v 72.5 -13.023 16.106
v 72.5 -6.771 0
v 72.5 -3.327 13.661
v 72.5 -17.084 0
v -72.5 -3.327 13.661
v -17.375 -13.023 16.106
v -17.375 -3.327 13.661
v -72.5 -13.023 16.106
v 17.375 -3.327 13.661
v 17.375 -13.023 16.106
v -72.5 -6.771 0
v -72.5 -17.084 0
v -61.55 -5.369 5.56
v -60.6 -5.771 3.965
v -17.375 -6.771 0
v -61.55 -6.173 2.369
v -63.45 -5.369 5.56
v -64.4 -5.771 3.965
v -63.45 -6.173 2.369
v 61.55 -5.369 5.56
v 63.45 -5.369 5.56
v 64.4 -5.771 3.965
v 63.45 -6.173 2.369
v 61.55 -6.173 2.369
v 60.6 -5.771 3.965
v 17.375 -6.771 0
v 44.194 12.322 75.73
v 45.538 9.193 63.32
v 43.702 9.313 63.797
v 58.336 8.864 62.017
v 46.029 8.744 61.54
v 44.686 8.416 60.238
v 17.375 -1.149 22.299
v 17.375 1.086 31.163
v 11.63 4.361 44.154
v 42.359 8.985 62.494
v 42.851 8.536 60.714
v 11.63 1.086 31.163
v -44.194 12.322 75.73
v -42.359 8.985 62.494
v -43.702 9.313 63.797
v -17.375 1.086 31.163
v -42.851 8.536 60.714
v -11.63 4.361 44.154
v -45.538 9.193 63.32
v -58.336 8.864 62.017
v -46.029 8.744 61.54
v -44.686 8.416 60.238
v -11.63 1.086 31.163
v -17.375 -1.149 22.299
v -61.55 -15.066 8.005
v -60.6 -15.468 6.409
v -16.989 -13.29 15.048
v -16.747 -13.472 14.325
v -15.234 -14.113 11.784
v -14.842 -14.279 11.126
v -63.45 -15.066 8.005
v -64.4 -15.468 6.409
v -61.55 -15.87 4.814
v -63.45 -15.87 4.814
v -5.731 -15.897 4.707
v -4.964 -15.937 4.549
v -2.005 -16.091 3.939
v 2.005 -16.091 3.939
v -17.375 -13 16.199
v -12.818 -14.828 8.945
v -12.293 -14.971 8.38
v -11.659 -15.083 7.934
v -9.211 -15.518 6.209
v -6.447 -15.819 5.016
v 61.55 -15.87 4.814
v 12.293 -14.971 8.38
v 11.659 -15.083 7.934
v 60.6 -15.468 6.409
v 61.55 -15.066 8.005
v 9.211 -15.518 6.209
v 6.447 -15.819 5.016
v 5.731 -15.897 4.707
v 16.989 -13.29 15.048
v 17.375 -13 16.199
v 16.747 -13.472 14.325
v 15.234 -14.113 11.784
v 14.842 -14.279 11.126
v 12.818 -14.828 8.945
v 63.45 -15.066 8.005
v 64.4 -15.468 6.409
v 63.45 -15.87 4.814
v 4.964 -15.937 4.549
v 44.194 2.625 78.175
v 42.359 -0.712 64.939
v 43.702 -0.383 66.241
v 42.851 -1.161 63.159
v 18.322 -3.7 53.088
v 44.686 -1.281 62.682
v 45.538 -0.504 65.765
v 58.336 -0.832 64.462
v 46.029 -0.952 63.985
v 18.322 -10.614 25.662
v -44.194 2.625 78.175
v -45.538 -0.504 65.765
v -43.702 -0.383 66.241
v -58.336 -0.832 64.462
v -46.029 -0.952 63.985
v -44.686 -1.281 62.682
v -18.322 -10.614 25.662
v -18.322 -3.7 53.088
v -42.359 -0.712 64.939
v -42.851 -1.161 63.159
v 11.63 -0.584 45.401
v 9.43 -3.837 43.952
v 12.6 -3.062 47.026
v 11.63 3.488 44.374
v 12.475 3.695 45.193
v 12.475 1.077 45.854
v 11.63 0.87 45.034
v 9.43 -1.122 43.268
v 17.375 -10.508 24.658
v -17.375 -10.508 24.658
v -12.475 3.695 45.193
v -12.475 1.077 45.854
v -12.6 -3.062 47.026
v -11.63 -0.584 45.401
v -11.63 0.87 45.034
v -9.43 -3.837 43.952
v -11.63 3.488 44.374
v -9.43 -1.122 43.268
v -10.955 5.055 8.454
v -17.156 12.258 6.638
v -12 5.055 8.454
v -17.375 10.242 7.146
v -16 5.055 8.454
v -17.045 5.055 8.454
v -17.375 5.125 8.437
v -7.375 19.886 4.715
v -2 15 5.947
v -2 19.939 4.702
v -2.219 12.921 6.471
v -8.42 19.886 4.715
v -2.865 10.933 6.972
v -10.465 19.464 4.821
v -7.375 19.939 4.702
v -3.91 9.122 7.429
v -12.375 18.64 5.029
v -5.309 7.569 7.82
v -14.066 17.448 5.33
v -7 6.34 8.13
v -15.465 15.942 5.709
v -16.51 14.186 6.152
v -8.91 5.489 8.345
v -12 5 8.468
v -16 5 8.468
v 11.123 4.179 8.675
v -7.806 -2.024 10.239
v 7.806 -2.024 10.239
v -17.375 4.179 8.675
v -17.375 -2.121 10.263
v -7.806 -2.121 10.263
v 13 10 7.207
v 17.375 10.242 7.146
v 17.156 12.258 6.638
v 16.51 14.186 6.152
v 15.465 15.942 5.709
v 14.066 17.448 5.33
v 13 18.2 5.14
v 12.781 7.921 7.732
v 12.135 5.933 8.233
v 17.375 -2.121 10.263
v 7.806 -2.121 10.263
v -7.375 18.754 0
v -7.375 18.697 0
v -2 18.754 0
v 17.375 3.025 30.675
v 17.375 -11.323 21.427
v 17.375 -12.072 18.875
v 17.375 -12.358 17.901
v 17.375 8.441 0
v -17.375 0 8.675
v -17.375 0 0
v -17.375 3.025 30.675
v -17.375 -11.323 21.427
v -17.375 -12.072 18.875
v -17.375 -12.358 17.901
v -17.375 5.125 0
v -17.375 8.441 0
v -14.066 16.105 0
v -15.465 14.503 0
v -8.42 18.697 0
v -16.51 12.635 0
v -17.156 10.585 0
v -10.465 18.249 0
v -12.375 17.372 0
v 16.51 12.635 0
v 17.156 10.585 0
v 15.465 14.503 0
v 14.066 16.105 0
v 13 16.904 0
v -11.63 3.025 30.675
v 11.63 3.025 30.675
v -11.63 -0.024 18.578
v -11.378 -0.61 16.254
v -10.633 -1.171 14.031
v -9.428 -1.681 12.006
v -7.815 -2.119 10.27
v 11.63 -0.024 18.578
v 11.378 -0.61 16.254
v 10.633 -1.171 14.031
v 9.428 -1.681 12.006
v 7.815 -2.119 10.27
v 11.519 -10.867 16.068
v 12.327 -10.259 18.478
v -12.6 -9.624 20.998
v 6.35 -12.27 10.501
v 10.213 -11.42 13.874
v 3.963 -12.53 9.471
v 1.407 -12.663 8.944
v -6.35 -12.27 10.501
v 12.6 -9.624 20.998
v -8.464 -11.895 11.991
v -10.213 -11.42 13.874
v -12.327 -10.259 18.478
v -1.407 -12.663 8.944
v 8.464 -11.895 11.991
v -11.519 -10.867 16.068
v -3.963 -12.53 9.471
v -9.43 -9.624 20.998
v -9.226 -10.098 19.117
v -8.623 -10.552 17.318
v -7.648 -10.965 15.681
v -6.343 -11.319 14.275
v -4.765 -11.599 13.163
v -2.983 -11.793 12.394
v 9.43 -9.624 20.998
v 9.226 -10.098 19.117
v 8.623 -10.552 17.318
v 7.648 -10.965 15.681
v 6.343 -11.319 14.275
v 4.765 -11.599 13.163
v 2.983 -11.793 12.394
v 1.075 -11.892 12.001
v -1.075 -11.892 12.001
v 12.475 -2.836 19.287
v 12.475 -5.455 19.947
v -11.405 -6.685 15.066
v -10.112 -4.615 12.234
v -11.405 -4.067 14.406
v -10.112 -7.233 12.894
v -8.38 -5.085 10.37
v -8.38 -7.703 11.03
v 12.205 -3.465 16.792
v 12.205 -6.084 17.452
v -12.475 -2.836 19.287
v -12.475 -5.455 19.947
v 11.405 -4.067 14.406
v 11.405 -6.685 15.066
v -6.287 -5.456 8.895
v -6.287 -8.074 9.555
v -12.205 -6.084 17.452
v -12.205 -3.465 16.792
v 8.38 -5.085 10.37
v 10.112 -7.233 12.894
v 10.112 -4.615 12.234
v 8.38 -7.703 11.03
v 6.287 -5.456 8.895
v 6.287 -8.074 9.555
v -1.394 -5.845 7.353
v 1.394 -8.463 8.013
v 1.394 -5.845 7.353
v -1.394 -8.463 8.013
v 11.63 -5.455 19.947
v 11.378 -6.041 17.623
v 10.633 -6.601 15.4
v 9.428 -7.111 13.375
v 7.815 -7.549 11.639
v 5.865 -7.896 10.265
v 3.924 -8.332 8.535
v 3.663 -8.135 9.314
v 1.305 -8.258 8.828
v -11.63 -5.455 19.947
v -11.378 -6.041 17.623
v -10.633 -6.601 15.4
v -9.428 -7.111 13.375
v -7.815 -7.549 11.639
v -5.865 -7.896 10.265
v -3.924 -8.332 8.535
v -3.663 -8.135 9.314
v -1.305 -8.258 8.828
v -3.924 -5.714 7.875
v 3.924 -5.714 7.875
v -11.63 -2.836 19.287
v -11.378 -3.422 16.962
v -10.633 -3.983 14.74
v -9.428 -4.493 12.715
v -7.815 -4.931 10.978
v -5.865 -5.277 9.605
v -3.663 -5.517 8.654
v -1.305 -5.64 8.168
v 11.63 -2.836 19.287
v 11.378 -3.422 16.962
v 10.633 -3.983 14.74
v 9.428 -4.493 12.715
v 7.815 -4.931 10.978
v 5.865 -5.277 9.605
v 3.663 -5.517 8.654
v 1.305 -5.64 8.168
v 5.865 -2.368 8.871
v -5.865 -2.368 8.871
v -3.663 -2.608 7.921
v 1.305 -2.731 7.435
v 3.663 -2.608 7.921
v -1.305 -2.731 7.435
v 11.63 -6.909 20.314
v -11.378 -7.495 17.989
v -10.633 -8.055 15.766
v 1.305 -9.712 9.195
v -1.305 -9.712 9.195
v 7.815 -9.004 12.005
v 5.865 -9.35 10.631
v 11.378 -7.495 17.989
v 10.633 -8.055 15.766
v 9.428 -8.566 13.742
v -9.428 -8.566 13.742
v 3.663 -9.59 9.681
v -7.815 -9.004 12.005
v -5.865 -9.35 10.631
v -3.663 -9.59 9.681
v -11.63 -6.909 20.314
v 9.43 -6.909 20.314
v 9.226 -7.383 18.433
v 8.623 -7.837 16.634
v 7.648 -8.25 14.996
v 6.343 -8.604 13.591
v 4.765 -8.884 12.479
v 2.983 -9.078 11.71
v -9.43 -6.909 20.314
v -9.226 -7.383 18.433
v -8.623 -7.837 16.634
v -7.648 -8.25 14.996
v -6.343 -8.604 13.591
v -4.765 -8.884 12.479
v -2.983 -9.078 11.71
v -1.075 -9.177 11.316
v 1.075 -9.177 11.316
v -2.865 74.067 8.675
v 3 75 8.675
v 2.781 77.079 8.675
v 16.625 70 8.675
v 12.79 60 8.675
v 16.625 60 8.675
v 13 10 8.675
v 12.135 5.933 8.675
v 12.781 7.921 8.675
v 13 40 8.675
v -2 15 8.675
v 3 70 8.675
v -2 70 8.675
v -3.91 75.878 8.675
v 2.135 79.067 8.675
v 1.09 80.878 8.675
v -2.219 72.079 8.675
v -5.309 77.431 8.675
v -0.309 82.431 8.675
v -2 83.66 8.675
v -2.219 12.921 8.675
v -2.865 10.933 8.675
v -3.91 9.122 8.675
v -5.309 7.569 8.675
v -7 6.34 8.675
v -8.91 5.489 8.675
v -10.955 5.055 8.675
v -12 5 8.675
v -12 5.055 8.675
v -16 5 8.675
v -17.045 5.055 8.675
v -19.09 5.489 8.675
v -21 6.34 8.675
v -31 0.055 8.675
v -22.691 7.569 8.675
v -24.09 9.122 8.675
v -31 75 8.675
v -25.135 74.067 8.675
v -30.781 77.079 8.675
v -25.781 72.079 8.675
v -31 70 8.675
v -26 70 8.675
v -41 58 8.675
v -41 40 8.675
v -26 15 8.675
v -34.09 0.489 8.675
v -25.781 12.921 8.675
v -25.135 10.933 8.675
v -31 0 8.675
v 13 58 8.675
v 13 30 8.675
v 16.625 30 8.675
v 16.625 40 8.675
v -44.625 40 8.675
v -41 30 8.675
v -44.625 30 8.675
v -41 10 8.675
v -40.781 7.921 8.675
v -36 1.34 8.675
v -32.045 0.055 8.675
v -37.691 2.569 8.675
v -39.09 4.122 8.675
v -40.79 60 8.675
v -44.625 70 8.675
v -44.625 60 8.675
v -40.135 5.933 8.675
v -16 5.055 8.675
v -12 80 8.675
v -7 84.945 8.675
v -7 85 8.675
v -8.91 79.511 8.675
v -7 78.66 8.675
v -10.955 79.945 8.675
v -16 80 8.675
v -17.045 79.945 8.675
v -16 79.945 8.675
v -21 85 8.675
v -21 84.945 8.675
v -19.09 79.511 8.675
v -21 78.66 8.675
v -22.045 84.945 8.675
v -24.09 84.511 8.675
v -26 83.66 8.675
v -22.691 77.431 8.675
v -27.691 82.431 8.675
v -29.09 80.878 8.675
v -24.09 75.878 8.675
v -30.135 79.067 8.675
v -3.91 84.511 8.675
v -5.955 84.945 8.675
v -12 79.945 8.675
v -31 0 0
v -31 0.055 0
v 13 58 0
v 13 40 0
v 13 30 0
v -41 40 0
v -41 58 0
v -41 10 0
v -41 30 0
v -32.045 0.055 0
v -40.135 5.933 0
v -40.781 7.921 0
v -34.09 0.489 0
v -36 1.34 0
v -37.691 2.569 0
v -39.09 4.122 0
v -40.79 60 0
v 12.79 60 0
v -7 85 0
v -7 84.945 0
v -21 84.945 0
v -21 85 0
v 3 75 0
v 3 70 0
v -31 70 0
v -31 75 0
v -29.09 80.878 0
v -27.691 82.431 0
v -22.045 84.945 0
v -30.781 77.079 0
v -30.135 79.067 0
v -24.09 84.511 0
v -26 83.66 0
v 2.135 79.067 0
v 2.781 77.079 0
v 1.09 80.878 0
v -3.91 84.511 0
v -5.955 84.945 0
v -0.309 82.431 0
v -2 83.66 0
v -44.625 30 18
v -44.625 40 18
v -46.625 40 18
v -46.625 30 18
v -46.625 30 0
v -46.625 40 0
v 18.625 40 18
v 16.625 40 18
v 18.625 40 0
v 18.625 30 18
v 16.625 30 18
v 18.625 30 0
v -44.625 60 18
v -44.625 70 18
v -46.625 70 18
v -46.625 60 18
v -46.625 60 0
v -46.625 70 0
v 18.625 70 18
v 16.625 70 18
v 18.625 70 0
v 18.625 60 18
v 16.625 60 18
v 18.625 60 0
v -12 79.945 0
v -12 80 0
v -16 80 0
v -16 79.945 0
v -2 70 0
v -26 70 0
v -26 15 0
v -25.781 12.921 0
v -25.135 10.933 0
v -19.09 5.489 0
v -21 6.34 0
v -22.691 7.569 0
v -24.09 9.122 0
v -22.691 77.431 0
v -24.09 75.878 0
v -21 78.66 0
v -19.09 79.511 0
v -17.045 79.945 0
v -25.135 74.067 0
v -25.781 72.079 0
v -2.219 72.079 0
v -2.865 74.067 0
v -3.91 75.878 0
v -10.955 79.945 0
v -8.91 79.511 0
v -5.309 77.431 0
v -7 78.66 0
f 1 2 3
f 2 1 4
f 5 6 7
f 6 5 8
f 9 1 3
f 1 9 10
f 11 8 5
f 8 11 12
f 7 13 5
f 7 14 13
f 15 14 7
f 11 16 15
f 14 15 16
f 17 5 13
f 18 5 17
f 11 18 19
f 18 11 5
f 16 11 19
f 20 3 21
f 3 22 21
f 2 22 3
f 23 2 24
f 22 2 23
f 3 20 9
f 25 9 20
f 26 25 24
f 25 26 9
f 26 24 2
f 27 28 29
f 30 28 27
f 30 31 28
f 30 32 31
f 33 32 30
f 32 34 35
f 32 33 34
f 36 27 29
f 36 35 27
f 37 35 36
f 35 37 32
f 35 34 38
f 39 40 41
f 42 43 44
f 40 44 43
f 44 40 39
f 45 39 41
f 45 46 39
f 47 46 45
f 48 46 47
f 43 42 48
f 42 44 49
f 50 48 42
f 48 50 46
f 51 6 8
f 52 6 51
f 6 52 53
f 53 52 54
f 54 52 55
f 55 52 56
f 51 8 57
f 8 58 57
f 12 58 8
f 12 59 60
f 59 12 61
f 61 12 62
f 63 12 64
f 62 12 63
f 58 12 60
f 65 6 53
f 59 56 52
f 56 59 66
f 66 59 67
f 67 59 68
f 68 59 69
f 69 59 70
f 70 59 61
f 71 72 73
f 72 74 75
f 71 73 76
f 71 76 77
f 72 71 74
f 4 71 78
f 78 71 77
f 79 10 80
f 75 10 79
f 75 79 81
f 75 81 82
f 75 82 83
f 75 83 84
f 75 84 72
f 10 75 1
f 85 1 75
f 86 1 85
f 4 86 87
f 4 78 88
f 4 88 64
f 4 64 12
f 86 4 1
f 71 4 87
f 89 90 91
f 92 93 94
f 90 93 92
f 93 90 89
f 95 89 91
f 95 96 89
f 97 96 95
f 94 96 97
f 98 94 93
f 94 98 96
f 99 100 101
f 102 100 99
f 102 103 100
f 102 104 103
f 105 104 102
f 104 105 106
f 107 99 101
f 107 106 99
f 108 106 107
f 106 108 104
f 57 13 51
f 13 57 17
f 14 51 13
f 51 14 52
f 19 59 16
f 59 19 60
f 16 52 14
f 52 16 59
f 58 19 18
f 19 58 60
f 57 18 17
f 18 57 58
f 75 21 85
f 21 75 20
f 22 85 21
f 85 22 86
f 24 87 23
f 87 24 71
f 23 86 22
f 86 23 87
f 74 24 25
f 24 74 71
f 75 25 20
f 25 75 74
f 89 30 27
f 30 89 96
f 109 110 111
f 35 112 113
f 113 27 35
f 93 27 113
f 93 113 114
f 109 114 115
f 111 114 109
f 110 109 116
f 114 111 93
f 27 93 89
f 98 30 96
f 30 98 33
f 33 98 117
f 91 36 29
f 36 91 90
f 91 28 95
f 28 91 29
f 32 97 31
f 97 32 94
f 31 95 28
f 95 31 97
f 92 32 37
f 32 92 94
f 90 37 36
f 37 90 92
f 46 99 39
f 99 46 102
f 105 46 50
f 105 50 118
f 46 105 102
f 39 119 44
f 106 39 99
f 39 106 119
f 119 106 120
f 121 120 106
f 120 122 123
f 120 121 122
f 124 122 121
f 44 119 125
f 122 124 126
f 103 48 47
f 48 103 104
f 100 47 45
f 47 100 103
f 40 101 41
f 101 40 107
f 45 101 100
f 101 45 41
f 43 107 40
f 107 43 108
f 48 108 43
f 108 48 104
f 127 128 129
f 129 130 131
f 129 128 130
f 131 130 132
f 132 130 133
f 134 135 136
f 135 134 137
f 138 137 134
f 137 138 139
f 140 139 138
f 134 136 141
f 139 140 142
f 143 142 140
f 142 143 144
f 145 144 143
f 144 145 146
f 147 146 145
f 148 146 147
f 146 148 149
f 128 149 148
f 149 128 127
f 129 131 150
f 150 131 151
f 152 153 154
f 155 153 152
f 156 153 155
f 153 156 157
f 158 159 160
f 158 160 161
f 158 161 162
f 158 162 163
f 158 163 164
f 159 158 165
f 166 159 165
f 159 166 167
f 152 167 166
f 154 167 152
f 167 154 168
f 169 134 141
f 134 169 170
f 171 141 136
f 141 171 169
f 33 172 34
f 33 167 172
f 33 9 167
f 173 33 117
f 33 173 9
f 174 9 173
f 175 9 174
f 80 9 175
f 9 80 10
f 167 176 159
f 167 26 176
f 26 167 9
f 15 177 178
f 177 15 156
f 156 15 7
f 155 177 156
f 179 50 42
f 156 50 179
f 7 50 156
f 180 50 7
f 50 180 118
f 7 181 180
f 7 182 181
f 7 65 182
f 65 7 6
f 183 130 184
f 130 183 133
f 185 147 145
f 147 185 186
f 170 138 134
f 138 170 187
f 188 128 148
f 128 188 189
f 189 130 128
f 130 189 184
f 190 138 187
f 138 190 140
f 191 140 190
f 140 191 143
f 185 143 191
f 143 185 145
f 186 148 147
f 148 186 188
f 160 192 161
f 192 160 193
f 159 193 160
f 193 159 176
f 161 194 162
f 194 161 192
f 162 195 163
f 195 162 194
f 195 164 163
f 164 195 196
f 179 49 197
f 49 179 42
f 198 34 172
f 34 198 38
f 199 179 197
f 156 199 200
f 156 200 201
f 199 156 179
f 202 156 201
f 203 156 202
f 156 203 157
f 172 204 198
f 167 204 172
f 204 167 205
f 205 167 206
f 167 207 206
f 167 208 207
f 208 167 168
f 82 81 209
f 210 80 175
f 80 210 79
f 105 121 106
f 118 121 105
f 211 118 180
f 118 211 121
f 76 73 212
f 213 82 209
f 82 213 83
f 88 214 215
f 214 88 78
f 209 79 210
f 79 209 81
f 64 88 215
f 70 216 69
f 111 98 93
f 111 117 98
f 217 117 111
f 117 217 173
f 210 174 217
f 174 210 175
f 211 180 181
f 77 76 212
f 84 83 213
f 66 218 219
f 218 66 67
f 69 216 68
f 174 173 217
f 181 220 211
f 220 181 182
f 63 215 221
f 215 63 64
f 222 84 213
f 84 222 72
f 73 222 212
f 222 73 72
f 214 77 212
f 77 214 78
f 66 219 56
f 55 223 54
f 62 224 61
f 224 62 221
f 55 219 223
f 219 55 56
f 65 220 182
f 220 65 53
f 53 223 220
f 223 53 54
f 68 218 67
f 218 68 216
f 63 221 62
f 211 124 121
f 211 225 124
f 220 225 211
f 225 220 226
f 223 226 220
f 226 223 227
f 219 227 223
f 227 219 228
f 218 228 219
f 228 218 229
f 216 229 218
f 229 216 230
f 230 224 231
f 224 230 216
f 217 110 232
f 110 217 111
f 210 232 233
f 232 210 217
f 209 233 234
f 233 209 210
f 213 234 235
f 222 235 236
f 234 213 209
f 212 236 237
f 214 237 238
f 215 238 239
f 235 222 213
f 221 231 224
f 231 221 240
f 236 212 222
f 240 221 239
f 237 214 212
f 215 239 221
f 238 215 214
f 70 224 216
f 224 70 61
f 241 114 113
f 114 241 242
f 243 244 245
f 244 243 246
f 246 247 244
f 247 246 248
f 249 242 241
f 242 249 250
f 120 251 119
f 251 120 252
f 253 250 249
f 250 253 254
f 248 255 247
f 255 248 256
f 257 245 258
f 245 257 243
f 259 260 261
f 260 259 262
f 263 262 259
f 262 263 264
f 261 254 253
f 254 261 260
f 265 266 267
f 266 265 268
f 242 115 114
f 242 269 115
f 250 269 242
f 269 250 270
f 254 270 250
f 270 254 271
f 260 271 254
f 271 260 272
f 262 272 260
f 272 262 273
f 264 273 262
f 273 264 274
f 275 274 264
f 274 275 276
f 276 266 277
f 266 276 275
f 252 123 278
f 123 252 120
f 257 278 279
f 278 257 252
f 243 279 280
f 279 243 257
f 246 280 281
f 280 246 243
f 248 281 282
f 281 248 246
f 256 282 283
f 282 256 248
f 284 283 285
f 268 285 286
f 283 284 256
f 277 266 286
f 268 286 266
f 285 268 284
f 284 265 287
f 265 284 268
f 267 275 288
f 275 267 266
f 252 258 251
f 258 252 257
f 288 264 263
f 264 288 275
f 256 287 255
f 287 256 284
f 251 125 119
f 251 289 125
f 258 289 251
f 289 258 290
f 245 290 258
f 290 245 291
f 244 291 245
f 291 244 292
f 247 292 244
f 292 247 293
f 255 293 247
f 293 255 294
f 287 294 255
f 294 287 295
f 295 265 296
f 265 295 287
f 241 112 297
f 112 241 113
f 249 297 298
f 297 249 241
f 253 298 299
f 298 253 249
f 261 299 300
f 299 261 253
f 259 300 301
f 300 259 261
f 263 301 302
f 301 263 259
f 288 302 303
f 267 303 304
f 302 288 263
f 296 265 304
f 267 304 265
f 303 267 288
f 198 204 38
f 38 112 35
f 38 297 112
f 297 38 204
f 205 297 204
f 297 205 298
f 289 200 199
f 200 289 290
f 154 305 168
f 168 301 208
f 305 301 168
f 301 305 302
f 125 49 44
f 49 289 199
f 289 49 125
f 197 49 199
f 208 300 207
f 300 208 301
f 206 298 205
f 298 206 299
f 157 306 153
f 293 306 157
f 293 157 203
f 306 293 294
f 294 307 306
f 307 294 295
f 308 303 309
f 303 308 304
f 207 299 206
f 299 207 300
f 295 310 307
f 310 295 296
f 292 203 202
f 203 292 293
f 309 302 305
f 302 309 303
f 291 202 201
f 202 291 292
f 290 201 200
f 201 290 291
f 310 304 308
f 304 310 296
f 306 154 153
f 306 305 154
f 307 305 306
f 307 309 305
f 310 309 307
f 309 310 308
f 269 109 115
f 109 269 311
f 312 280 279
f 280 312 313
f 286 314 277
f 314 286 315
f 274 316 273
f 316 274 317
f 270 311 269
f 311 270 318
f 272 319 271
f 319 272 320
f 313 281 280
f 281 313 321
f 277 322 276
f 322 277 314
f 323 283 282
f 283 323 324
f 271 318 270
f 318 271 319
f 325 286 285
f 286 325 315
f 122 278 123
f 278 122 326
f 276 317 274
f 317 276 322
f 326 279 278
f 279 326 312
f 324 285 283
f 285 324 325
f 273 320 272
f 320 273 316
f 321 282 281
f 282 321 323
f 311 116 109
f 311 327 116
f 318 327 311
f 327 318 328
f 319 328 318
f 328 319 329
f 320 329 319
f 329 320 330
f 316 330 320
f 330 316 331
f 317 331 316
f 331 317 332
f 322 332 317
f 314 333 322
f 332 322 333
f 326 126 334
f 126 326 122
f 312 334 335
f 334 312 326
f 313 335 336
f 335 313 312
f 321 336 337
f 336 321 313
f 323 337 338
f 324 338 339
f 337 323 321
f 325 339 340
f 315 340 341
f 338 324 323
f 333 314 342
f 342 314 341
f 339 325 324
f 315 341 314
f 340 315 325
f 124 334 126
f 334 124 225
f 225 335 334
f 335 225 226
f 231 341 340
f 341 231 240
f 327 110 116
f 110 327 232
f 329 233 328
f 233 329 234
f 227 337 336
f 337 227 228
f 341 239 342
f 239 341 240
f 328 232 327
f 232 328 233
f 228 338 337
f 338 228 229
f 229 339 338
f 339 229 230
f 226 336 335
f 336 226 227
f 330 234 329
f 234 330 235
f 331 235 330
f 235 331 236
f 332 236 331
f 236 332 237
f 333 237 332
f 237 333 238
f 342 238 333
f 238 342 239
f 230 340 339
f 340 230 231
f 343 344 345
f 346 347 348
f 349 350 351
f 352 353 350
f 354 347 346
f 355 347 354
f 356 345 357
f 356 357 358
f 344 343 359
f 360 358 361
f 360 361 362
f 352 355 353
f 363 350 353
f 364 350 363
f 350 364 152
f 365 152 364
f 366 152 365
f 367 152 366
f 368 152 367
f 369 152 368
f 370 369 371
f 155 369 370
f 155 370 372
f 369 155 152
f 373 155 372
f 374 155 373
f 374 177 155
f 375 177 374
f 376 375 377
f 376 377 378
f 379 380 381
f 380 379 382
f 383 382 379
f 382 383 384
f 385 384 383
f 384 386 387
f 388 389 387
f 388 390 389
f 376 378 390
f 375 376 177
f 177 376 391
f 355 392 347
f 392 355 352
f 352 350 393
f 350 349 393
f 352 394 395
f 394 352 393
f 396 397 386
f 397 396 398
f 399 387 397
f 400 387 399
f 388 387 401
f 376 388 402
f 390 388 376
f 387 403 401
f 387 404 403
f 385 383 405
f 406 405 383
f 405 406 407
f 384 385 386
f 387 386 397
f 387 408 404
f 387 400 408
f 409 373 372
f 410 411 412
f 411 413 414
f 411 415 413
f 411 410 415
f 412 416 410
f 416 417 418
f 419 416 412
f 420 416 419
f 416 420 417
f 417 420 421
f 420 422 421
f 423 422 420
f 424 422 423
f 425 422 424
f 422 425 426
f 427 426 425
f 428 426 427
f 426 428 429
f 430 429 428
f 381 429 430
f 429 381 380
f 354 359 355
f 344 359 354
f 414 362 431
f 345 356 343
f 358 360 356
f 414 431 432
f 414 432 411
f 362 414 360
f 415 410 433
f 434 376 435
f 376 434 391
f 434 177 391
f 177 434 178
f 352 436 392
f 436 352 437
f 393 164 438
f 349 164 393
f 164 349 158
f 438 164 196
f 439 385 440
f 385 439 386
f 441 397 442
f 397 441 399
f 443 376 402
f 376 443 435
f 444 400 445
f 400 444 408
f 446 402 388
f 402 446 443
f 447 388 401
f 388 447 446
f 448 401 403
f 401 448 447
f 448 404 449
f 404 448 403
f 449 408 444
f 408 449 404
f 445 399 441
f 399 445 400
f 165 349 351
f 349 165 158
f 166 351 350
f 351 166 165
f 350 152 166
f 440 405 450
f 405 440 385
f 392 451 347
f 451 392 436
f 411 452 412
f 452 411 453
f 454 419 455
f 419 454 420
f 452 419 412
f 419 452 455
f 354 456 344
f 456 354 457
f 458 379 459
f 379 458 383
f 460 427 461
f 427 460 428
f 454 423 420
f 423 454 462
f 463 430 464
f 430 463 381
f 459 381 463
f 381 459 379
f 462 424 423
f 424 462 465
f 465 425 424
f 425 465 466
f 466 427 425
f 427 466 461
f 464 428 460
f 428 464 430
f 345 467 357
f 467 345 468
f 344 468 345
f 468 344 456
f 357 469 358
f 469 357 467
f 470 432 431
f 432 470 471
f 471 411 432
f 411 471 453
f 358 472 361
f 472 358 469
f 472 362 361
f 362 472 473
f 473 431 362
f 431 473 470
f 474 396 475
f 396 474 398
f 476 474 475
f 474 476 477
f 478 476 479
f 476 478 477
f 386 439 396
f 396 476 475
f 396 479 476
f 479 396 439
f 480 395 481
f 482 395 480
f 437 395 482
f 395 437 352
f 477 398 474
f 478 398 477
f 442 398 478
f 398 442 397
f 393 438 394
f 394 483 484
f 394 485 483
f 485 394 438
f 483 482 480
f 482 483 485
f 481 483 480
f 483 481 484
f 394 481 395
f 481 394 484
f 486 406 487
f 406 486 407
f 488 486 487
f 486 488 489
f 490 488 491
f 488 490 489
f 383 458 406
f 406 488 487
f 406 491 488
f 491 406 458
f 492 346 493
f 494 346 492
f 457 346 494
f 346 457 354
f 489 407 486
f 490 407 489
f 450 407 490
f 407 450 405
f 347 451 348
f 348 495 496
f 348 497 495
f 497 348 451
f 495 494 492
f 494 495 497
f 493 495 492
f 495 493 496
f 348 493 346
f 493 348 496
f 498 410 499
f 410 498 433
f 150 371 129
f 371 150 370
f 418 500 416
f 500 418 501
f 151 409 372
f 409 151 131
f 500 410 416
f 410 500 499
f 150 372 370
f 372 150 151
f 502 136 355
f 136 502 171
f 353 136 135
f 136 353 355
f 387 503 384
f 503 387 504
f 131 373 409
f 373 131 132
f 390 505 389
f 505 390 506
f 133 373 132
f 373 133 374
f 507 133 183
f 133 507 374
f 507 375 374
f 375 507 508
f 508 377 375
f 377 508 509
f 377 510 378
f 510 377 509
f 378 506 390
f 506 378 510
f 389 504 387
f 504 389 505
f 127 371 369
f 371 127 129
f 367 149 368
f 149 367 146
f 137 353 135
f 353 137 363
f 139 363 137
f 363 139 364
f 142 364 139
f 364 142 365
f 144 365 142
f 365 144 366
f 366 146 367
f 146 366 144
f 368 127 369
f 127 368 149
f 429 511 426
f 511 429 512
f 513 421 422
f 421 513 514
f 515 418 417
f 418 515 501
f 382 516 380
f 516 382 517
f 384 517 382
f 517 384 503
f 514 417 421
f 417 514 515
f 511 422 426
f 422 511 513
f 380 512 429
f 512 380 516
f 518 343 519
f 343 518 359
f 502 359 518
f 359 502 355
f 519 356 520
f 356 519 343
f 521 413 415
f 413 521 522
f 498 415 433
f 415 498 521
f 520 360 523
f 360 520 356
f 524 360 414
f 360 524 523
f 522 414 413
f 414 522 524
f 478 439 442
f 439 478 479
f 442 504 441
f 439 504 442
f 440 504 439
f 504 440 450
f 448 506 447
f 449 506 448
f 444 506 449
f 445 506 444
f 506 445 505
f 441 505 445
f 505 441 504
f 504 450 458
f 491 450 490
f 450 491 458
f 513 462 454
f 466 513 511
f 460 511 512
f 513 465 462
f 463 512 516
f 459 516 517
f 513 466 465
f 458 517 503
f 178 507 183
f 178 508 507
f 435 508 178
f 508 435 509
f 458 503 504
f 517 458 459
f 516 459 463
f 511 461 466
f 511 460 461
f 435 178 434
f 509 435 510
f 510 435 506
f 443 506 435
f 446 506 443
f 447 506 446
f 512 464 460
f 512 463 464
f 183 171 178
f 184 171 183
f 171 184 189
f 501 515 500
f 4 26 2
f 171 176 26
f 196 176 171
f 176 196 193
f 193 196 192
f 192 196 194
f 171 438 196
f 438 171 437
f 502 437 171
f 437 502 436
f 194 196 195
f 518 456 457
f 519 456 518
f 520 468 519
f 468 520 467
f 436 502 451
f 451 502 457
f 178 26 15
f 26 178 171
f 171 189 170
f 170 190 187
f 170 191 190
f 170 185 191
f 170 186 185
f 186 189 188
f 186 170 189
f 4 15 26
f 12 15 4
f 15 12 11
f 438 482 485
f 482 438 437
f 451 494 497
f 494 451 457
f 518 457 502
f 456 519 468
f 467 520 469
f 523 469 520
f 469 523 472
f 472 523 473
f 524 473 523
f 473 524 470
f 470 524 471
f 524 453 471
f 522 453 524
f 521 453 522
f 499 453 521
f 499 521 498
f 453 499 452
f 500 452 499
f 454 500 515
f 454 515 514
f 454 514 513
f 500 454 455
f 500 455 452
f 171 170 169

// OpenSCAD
opteka_r1 = 24.75/2;
opteka_r2 = 41.35/2;

module rounded(size, r) {
    union() {
        translate([r, 0, 0]) cube([size[0]-2*r, size[1], size[2]]);
        translate([0, r, 0]) cube([size[0], size[1]-2*r, size[2]]);
        translate([r, r, 0]) cylinder(h=size[2], r=r);
        translate([size[0]-r, r, 0]) cylinder(h=size[2], r=r);
        translate([r, size[1]-r, 0]) cylinder(h=size[2], r=r);
        translate([size[0]-r, size[1]-r, 0]) cylinder(h=size[2], r=r);
    }
}

module opteka() {
    union() {
        cylinder(r=23.06/2, h=7);
        translate([0, 0, 3]) cylinder(r=opteka_r1, h=2.5);
        cylinder(r=18.66/2, h=10);
        translate([0, 0, 10]) cylinder(r1=25/2, r2=opteka_r2, h=3);
        translate([0, 0, 13]) cylinder(r=opteka_r2, h=8.42);
    }
}

margin = 0.1;
angle = -14.15;
wall = 5;
wall2 = 2;
image_h = 10;

showwx_offset = 14;
showwx_w = 61.25;
showwx_wb = 54;
showwx_wb2 = 34;
showwx_l1 = 68;
showwx_l2 = 85;

globe_r1 = 98/2;
globe_r2 = 105/2;
globe_h = 15;
globe_bolt = 3.8/2;

module lens_mount() difference() {
    translate([0, 0, -2]) union() {
        translate([0, 0, opteka_r2]) rotate([angle, 0, 0]) difference() {
            union() {
                difference() {
                    translate([-globe_r2-4*wall, -12, -opteka_r2-wall]) cube([2*(globe_r2+4*wall), 2*wall, 4*wall]);
                    translate([-globe_r2-2*wall, -12, -opteka_r2+wall]) rotate([-90, 0, 0]) cylinder(r=globe_bolt, h=20);
                    translate([globe_r2+2*wall, -12, -opteka_r2+wall]) rotate([-90, 0, 0]) cylinder(r=globe_bolt, h=20);
                }
                for(t = [-45, -135]) {
                    rotate([0, t, 0]) translate([0, -12, -2*wall]) difference() {
                        cube([globe_r2+4*wall, 2*wall, 4*wall]);
                        translate([globe_r2+2*wall, 0, 2*wall]) rotate([-90, 0, 0]) cylinder(r=globe_bolt, h=globe_h);
                    }
                }
                translate([-opteka_r1-wall, -12, -opteka_r2-wall]) union() {
                    cube([2*(opteka_r1+wall), 12, (opteka_r2+wall+opteka_r1)]);
                    rounded([2*(opteka_r1+wall), 2*(opteka_r1+wall), 17], 10);
                }
            }
            minkowski() {
                rotate([90, 0, 0]) opteka();
                translate([-margin, -margin, -margin]) cube([margin*2, margin*2, 50+margin]);
            }
        }
        
        
        translate([-showwx_offset, 0, 0]) difference() {
            union() {
                translate([-showwx_wb/2, 0, 0]) rounded([showwx_wb, showwx_l1, opteka_r2-image_h], 10);
                translate([-showwx_wb2/2, 0, 0]) rounded([showwx_wb2, showwx_l2, opteka_r2-image_h], 10);
                for(y = [30, 60]) {
                    union() {
                        translate([-showwx_w/2-wall2, y, 0]) cube([wall2, 10, 20]);
                        translate([showwx_w/2, y, 0]) cube([wall2, 10, 20]);
                        translate([-showwx_w/2, y, 0]) cube([showwx_w, 10, opteka_r2-image_h]);
                    }
                }
            }
            translate([-showwx_wb2/2+wall, wall, 0]) rounded([showwx_wb2-2*wall, showwx_l2-2*wall, 50], 10);
        }
    }
    
    translate([-200, -200, -100]) cube([400, 400, 100]);
}

module globe_mount() {
    difference() {
        union() {
            cylinder(r1=globe_r2+wall, r2=globe_r1+wall, h=globe_h);
            translate([-globe_r2-4*wall, -opteka_r2-wall, 0]) difference() {
                rounded([2*(globe_r2+4*wall), 4*wall, wall],2);
                translate([2*wall, 2*wall, 0]) cylinder(r=globe_bolt, h=globe_h);
                translate([2*globe_r2+6*wall, 2*wall, 0]) cylinder(r=globe_bolt, h=globe_h);
            }
            for(t = [45, 135]) {
                rotate([0, 0, t]) translate([0, -2*wall, 0]) difference() {
                    rounded([globe_r2+4*wall, 4*wall, wall], 2);
                    translate([globe_r2+2*wall, 2*wall, 0]) cylinder(r=globe_bolt, h=globe_h);
                }
            }
            for(i = [0:11]) {
                rotate([0, 0, i*360/12]) translate([-globe_r2-wall, -wall, 0]) cube([20, 2*wall, globe_h/2+wall]);
            }
        }
        cylinder(r1=globe_r2, r2=globe_r1, h=globe_h-wall);
        cylinder(r=globe_r1, h=globe_h+1);
        translate([-wall, -globe_r2-2*wall, 0]) cube([2*wall, 2*(globe_r2+2*wall), globe_h+1]);
        for(i = [0:11]) {
            rotate([0, 0, i*360/12]) translate([-globe_r2-wall, 0, globe_h/2]) rotate([0, 90, 0]) cylinder(r=globe_bolt, h=20);
        }
    }
}

lens_mount();

//globe_mount();
